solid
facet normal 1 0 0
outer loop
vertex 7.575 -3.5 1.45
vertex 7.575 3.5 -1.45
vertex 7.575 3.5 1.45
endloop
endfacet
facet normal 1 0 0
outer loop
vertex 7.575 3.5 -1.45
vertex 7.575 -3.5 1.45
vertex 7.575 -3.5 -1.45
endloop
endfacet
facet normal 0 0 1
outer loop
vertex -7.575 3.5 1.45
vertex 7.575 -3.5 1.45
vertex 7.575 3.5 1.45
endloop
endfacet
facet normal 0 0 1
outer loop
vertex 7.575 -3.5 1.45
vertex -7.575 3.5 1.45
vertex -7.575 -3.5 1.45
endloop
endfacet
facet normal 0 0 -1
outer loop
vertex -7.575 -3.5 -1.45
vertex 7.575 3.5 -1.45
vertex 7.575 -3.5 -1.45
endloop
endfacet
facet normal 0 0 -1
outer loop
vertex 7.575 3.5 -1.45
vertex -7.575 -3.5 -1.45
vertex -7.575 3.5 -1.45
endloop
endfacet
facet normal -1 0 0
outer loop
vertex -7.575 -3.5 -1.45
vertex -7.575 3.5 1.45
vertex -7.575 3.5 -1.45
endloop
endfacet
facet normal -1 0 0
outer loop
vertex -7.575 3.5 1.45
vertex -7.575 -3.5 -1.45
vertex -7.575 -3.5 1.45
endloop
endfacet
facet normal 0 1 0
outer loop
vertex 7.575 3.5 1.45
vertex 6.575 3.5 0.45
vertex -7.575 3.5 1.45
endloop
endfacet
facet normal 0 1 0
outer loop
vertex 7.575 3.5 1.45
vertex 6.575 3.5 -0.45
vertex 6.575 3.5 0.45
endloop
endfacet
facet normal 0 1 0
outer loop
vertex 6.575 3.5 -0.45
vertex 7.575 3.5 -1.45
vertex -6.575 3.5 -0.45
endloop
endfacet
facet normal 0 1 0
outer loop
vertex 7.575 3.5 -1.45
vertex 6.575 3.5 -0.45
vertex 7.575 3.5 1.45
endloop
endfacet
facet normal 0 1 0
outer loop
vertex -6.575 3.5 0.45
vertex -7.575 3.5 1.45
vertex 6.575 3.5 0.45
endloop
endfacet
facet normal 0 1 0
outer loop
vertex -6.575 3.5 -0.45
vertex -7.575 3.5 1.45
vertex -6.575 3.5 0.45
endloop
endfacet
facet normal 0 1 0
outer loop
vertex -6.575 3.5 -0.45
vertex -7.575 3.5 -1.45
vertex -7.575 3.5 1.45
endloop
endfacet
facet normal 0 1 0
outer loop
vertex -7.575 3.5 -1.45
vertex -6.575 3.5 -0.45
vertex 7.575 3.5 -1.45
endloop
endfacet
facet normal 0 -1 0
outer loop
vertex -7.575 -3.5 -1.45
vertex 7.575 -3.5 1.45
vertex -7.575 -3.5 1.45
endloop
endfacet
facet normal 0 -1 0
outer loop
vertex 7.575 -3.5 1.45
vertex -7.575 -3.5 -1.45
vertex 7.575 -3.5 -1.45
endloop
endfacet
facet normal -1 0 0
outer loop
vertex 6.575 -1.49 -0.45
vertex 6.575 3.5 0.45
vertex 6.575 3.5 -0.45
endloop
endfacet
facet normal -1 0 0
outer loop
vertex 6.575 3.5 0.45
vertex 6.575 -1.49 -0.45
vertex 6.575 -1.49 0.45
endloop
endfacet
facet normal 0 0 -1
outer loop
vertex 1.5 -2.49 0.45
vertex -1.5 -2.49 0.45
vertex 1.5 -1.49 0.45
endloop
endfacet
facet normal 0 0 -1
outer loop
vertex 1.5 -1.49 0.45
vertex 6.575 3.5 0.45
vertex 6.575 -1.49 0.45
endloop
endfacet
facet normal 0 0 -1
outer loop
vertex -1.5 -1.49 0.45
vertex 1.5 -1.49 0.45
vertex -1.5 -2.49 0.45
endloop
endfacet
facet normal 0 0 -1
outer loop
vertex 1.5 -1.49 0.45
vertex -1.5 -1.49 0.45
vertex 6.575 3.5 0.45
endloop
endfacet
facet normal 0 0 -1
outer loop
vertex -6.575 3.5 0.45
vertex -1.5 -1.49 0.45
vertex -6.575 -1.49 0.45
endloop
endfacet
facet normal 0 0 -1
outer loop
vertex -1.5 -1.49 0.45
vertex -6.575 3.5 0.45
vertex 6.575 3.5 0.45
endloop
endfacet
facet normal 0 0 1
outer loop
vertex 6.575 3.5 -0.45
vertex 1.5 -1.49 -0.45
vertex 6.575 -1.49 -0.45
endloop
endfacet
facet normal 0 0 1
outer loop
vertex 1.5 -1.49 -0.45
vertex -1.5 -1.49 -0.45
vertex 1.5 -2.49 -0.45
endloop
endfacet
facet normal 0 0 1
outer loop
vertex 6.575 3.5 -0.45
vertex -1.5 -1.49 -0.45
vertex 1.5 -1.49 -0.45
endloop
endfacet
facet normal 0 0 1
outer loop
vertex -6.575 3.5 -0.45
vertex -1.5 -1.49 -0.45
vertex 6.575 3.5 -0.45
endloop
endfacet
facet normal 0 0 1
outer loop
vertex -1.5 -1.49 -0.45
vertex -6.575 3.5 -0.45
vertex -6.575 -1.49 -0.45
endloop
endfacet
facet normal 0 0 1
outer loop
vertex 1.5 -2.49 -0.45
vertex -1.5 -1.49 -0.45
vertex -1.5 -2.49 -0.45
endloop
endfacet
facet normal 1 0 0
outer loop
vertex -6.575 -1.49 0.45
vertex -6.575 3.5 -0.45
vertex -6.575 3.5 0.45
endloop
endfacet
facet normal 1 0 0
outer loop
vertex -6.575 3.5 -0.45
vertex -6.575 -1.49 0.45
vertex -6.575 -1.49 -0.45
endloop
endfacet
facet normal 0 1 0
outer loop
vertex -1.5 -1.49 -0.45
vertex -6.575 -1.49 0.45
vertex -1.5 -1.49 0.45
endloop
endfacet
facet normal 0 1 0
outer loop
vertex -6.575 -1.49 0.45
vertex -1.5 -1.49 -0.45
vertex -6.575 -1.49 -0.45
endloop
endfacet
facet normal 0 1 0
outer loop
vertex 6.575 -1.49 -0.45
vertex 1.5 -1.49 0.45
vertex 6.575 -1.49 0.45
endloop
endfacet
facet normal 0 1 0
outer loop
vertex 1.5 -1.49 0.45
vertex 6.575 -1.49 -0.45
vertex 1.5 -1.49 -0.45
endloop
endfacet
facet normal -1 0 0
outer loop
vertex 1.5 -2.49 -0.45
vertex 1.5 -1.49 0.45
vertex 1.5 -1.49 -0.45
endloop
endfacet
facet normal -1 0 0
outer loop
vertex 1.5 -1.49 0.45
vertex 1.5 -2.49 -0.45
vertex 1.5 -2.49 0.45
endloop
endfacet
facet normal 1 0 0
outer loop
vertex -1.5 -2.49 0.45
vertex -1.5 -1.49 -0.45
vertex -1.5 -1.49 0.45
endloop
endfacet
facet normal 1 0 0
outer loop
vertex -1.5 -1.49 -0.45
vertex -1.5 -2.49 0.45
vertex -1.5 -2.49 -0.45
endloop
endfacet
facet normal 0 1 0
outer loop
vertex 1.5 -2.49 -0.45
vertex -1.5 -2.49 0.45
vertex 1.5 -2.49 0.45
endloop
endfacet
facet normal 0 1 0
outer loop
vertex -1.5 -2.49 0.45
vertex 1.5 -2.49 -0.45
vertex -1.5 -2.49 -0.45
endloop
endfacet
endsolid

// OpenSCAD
holeWidth = 13.15;
holeHeight = 0.9;
holeDepth = 5;
surround=2;

difference() {
    cube([holeWidth+surround, holeDepth+surround, holeHeight+surround], center=true);
    translate([0,surround/2+0.01,0])
    cube([holeWidth, holeDepth, holeHeight], center=true);
    translate([0,surround/2+0.01-0.5,0])
    cube([3, holeDepth+1, holeHeight], center=true);
}
